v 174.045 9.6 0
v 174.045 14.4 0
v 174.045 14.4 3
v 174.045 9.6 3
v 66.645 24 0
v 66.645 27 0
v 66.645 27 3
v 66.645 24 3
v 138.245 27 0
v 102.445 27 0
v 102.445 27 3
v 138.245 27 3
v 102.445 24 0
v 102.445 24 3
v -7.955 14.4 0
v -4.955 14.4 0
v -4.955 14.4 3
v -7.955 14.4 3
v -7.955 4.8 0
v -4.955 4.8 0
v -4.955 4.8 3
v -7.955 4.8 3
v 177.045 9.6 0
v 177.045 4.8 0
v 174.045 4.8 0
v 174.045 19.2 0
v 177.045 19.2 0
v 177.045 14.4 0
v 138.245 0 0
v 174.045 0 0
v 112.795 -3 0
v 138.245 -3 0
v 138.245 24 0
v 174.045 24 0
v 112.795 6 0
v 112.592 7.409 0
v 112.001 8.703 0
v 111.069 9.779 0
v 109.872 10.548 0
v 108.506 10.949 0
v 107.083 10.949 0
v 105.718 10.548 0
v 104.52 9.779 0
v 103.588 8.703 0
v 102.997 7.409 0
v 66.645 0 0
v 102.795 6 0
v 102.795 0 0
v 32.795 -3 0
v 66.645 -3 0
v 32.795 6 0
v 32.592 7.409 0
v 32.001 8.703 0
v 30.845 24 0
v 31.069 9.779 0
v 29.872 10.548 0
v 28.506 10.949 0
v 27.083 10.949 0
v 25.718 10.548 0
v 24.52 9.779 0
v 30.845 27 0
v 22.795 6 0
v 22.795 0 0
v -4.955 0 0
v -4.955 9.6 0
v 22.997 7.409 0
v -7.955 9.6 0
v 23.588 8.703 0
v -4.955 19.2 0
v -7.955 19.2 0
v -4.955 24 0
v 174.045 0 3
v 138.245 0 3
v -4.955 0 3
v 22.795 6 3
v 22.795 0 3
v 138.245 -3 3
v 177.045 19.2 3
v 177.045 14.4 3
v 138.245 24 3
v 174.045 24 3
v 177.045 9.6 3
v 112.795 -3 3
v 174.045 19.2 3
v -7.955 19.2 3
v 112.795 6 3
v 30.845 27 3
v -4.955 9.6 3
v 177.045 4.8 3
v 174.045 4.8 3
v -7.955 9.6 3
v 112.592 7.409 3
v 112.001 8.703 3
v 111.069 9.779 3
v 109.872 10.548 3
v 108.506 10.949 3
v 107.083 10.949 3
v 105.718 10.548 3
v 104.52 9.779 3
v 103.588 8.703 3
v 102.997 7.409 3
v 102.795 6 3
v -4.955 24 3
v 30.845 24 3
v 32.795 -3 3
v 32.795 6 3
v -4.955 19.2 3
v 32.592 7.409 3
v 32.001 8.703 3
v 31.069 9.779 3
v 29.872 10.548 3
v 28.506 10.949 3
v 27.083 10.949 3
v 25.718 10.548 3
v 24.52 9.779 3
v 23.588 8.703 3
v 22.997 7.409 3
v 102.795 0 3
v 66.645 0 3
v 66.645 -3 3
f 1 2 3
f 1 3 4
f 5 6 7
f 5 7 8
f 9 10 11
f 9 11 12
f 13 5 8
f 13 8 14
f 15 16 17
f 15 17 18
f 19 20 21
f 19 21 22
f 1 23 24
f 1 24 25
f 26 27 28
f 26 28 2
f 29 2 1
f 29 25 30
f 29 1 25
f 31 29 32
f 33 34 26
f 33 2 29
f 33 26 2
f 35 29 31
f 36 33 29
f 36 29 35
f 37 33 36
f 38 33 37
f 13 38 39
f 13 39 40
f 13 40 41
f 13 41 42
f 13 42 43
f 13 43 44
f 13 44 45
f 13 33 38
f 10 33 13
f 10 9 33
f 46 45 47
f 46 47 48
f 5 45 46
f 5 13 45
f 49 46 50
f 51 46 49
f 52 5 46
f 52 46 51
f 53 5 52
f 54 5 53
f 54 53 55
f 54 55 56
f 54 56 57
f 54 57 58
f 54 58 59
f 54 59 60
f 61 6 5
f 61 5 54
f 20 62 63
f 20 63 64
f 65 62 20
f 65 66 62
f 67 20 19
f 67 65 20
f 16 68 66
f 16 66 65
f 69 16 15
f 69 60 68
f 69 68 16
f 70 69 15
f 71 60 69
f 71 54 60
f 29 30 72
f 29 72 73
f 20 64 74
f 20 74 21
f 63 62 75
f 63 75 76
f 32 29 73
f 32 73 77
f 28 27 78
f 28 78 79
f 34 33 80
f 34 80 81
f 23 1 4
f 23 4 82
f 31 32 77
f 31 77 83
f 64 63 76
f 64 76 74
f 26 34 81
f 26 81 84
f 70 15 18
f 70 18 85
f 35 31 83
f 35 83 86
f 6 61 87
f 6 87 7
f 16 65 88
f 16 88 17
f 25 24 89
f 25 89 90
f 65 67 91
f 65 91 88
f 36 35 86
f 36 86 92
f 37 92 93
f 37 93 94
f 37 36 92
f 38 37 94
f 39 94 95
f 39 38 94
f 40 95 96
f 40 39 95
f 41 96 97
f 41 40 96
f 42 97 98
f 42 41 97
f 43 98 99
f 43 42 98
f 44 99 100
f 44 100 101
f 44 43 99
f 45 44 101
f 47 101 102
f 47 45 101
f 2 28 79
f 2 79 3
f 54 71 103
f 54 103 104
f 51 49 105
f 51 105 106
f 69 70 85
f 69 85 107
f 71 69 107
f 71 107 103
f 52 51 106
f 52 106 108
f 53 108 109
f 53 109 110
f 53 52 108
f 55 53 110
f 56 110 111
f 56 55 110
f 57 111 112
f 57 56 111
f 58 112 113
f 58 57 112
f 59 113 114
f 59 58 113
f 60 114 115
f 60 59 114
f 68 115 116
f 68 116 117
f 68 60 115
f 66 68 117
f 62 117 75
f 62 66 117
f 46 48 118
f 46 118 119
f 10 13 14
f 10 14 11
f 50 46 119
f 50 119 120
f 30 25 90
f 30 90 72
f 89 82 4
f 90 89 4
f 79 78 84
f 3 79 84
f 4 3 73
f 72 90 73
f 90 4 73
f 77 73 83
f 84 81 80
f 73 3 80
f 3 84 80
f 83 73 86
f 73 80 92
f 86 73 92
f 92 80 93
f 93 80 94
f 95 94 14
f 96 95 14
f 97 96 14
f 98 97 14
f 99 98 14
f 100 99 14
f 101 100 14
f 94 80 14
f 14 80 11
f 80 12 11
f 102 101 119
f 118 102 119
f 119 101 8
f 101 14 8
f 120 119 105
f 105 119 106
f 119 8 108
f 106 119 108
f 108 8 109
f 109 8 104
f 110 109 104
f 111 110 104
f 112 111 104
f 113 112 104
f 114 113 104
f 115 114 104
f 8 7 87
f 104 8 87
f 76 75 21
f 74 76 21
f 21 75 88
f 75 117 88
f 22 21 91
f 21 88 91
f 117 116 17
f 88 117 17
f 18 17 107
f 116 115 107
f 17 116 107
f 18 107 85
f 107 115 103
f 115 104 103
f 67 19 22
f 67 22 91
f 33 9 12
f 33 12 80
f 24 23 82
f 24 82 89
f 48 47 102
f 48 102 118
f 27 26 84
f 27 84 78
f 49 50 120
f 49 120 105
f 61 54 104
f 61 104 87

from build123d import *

# Parameters (mm, degrees)
BOSS_EXTRUDE1_DEPTH = 3


with BuildPart() as part:
    # Sketch1 → Boss-Extrude1 (new body)
    with BuildSketch(Plane.XY):
        with BuildLine():
            Line((-4.955370371, 4.8), (-7.955370371, 4.8))
            Line((-7.955370371, 4.8), (-7.955370371, 9.6))
            Line((-7.955370371, 9.6), (-4.955370371, 9.6))
            Line((-4.955370371, 9.6), (-4.955370371, 14.4))
            Line((-4.955370371, 14.4), (-7.955370371, 14.4))
            Line((-7.955370371, 14.4), (-7.955370371, 19.2))
            Line((-7.955370371, 19.2), (-4.955370371, 19.2))
            Line((-4.955370371, 19.2), (-4.955370371, 24))
            Line((-4.955370371, 24), (30.844629629, 24))
            Line((30.844629629, 24), (30.844629629, 27))
            Line((30.844629629, 27), (66.644629629, 27))
            Line((66.644629629, 27), (66.644629629, 24))
            Line((66.644629629, 24), (102.444629629, 24))
            Line((102.444629629, 24), (102.444629629, 27))
            Line((102.444629629, 27), (138.244629629, 27))
            Line((138.244629629, 27), (138.244629629, 24))
            Line((138.244629629, 24), (174.044629629, 24))
            Line((174.044629629, 24), (174.044629629, 19.2))
            Line((174.044629629, 19.2), (177.044629629, 19.2))
            Line((177.044629629, 19.2), (177.044629629, 14.4))
            Line((177.044629629, 14.4), (174.044629629, 14.4))
            Line((174.044629629, 14.4), (174.044629629, 9.6))
            Line((174.044629629, 9.6), (177.044629629, 9.6))
            Line((177.044629629, 9.6), (177.044629629, 4.8))
            Line((177.044629629, 4.8), (174.044629629, 4.8))
            Line((174.044629629, 4.8), (174.044629629, 0))
            Line((174.044629629, 0), (138.244629629, 0))
            Line((138.244629629, 0), (138.244629629, -3))
            Line((138.244629629, -3), (112.794629629, -3))
            Line((112.794629629, -3), (112.794629629, 0))
            Line((112.794629629, 0), (112.794629629, 6))
            ThreePointArc((112.794629629, 6), (107.794629629, 11), (102.794629629, 6))
            Line((102.794629629, 6), (102.794629629, 0))
            Line((102.794629629, 0), (102.444629629, 0))
            Line((102.444629629, 0), (66.644629629, 0))
            Line((66.644629629, 0), (66.644629629, -3))
            Line((66.644629629, -3), (32.794629629, -3))
            Line((32.794629629, -3), (32.794629629, 6))
            ThreePointArc((32.794629629, 6), (27.794629629, 11), (22.794629629, 6))
            Line((22.794629629, 6), (22.794629629, 0))
            Line((22.794629629, 0), (-4.955370371, 0))
            Line((-4.955370371, 0), (-4.955370371, 4.8))
        make_face()
    extrude(amount=BOSS_EXTRUDE1_DEPTH)


solid = part.part
